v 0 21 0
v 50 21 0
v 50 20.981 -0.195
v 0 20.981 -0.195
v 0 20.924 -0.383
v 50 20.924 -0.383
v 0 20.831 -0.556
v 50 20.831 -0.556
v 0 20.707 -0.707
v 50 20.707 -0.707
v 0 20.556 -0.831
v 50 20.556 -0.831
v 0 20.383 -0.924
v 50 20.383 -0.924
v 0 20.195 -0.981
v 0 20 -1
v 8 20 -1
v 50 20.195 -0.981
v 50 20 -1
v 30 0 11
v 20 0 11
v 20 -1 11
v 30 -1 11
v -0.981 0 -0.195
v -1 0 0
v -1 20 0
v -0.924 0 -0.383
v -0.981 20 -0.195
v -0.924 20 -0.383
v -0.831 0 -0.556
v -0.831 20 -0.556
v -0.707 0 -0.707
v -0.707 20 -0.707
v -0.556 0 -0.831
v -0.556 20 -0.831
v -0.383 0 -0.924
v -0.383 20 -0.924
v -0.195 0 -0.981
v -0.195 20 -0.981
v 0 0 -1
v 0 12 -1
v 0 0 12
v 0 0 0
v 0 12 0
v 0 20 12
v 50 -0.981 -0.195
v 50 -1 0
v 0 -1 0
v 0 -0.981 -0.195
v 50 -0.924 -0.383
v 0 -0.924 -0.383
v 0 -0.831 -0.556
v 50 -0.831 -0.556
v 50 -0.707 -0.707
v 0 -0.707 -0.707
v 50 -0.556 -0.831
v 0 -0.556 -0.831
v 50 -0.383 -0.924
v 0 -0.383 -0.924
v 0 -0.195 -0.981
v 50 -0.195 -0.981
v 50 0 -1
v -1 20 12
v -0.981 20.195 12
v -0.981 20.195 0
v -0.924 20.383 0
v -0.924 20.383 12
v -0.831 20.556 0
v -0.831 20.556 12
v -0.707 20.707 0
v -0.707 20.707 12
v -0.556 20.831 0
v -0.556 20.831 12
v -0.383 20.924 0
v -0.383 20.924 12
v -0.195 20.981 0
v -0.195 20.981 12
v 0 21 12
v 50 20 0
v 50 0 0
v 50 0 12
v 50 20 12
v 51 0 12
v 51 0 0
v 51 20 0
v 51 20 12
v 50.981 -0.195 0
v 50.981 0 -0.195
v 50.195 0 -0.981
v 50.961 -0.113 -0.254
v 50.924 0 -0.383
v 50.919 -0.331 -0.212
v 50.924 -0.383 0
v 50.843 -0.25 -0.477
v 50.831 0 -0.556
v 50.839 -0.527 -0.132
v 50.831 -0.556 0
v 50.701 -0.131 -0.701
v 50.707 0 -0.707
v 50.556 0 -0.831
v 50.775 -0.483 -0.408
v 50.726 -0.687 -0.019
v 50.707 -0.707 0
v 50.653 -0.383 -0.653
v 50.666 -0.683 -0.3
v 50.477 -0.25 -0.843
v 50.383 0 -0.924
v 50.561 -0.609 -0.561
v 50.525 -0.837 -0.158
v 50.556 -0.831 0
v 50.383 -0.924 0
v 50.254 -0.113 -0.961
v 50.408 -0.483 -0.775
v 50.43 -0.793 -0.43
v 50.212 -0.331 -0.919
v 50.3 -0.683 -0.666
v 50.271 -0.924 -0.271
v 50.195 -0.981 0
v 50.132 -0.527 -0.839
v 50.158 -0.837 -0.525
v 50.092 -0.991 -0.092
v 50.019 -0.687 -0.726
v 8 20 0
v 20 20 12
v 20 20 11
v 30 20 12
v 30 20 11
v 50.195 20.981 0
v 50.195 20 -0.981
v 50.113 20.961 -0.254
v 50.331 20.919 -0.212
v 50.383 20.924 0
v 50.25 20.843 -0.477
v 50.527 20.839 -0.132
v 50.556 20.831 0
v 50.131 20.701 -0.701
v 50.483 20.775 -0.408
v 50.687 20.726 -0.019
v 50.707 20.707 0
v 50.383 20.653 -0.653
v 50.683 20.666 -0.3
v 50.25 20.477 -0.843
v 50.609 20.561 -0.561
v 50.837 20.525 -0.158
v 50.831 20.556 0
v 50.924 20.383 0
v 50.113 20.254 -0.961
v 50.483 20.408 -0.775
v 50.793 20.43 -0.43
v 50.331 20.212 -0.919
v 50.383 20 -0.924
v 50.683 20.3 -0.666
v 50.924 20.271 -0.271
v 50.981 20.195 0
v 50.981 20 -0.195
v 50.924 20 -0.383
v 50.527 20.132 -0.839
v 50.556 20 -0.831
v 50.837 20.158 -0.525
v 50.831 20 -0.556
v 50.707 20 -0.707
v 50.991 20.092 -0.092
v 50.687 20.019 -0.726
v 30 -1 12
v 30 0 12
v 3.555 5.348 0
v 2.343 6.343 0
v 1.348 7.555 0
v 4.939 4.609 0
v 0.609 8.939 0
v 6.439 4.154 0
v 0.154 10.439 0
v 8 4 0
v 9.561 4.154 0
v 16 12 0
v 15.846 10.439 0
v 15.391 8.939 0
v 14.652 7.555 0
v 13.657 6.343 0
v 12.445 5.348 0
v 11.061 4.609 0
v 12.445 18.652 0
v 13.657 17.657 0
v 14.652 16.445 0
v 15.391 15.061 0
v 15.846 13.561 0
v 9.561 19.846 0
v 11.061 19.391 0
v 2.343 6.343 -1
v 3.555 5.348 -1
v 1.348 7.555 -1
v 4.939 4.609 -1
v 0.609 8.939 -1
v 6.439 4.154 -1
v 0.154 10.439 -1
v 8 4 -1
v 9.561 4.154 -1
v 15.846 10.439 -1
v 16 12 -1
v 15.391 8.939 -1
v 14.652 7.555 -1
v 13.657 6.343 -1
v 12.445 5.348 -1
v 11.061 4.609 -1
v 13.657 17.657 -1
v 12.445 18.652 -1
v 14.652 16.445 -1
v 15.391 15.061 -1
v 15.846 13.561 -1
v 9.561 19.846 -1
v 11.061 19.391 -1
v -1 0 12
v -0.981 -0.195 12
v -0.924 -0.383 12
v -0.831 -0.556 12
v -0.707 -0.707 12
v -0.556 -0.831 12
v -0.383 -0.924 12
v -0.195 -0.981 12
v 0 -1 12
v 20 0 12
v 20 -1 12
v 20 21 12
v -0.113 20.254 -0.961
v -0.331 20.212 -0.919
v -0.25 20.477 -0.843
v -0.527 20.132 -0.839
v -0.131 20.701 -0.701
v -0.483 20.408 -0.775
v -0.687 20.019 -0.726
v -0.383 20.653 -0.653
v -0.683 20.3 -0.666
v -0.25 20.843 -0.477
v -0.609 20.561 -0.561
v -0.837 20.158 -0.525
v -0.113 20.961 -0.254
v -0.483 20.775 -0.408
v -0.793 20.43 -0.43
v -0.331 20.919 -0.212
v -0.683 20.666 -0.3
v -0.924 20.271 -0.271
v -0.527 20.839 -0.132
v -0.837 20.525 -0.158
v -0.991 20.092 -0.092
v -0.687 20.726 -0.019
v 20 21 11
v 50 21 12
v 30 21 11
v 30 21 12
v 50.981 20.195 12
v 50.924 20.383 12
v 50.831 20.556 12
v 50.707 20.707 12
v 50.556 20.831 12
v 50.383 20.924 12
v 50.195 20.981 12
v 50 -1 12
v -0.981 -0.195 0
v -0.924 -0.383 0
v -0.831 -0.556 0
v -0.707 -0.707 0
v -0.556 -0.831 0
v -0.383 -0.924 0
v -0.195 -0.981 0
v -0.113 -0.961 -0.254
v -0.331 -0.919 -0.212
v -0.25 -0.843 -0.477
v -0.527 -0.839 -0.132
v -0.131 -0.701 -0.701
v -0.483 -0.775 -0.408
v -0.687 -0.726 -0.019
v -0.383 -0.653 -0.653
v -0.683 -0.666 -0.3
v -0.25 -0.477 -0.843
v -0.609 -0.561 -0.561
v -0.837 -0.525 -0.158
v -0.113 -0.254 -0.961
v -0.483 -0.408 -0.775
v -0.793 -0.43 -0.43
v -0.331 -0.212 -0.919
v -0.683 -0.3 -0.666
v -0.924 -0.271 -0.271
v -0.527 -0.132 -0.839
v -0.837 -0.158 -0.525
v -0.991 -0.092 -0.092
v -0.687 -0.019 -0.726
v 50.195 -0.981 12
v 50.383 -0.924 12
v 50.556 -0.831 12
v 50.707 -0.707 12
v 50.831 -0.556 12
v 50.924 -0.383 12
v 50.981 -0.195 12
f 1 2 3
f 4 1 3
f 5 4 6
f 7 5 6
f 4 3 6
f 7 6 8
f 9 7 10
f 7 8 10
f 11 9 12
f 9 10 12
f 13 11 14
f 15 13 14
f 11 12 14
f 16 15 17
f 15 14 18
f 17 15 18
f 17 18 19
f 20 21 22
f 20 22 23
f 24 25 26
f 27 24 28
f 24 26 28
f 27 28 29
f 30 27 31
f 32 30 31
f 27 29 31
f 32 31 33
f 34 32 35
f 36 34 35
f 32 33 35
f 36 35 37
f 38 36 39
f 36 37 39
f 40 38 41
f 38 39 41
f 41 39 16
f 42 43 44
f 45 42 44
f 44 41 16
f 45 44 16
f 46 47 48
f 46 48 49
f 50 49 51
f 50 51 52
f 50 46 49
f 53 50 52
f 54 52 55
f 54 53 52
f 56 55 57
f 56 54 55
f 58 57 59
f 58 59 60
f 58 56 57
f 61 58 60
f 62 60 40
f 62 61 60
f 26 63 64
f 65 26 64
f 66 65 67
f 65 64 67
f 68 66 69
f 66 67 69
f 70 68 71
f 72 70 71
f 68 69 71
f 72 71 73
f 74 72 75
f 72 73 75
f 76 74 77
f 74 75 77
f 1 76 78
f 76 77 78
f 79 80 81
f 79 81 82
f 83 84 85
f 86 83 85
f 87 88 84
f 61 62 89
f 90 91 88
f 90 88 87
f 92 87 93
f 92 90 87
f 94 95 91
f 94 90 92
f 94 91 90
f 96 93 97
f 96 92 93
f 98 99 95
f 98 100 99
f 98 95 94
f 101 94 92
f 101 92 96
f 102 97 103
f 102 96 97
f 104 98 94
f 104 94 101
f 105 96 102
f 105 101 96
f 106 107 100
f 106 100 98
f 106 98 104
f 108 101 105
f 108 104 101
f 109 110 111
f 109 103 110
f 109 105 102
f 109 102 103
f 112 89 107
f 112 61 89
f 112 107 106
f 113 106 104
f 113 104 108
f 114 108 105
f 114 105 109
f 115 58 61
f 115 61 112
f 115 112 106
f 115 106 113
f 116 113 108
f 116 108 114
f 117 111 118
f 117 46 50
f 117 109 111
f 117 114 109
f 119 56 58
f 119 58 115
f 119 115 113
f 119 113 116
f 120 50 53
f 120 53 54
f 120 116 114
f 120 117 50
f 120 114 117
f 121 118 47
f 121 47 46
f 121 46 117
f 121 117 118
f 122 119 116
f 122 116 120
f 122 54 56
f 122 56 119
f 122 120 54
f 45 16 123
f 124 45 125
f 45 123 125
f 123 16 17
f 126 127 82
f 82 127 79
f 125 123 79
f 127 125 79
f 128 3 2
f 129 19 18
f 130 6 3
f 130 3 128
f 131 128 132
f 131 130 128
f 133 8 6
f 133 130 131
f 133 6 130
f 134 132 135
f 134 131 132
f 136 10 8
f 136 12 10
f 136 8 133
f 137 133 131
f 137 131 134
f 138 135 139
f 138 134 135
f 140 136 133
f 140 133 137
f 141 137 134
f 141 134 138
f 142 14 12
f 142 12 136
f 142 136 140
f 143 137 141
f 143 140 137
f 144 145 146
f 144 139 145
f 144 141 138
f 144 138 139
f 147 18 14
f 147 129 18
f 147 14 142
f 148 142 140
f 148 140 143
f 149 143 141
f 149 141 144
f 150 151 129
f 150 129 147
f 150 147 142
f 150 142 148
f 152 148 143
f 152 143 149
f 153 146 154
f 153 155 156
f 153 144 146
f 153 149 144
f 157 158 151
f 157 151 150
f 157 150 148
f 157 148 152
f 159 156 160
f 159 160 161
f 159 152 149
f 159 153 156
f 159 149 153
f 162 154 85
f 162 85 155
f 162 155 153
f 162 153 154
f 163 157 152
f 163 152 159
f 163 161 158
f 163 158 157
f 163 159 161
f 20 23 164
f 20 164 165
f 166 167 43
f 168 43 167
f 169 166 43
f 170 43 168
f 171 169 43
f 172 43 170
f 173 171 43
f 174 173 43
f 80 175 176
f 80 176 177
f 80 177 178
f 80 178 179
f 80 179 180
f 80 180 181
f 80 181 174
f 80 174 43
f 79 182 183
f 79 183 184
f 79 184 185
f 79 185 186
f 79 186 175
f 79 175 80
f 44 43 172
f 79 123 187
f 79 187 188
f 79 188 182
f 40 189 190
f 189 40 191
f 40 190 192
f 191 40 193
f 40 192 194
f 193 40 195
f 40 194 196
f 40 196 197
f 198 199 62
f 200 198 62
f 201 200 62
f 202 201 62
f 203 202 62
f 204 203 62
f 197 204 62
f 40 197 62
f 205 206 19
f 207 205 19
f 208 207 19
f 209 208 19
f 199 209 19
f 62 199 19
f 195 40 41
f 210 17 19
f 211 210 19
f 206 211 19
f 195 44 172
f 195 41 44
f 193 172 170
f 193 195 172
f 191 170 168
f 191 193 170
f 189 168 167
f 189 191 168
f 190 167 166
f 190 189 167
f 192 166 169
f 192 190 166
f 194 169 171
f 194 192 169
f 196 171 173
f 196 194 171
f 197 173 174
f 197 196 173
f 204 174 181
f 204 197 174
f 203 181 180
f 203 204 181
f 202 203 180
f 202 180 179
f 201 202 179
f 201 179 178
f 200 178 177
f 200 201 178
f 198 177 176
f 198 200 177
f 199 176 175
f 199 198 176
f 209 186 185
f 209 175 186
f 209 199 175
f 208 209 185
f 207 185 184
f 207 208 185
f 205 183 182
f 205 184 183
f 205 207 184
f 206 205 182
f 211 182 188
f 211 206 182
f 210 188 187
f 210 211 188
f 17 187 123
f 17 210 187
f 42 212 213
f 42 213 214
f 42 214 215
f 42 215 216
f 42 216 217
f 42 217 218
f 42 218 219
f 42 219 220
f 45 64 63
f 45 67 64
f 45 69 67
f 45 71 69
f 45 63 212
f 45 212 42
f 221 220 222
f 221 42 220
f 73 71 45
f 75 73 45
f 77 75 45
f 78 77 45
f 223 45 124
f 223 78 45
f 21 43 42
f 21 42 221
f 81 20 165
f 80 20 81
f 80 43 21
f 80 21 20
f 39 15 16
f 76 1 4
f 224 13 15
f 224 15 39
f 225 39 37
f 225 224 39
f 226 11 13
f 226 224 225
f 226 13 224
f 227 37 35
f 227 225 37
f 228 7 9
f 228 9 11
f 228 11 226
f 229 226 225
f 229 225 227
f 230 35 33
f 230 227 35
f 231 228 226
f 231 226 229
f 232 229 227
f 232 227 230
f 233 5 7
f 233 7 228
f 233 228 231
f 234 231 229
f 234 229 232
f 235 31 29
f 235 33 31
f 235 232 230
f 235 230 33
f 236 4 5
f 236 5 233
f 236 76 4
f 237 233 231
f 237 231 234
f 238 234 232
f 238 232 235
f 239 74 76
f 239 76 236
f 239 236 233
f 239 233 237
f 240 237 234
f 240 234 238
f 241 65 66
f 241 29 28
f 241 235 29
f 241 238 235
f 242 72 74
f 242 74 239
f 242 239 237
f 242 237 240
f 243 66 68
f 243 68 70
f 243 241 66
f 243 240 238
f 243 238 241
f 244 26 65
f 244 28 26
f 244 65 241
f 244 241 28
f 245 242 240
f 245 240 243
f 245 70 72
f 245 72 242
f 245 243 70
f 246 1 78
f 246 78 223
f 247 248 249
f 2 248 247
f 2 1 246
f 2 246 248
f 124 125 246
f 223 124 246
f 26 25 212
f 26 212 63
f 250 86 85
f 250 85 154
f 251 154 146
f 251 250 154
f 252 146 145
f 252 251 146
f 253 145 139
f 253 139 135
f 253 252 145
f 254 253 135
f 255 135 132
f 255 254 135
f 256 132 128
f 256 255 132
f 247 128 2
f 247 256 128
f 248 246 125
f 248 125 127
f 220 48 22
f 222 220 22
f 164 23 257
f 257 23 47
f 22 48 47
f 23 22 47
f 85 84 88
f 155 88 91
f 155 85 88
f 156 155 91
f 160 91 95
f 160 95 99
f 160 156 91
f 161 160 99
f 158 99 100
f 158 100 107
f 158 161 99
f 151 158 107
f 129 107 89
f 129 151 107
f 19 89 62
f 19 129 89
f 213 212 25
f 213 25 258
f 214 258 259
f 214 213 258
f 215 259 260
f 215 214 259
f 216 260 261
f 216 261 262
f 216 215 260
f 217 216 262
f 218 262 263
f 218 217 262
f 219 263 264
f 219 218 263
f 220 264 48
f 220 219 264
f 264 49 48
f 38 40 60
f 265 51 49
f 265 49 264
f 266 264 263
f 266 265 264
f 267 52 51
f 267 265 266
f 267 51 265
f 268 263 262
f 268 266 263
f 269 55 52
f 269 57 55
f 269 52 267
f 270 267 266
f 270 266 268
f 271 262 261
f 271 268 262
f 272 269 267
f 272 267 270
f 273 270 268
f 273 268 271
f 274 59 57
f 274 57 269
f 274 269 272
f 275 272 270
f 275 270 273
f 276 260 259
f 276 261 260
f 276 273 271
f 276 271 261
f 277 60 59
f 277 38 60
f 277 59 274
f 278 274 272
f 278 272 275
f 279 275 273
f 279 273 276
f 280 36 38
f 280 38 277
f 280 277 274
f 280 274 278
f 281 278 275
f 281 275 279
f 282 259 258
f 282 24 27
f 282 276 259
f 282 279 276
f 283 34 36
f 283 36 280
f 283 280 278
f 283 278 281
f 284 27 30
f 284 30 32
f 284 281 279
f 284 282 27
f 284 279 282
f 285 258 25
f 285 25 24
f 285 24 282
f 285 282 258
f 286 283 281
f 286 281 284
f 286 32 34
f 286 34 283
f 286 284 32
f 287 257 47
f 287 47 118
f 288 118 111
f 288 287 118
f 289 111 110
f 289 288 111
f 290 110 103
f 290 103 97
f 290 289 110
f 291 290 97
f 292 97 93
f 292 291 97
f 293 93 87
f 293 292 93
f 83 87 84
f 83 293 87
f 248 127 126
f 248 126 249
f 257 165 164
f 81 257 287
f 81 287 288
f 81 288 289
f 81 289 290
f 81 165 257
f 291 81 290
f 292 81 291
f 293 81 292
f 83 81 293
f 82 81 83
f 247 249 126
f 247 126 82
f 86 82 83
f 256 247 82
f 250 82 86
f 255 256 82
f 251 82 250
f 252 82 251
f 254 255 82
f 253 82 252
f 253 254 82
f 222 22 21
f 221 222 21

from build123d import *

# Parameters (mm, degrees)
BOX_W          = 50
BOX_H          = 20
BOX_DEPTH      = 12
THICKNESS_T    = 1
CYLINDER_R     = 8
CYLINDER_DEPTH = 1
BOX001_W       = 10
BOX001_H       = 22
BOX001_DEPTH   = 1
BOX002_W       = 8
BOX002_H       = 8
BOX002_DEPTH   = 1


with BuildPart() as part:
    # Box → Box (join)
    with BuildSketch(Plane.XY):
        with Locations((25, 10)):
            Rectangle(BOX_W, BOX_H)
    extrude(amount=BOX_DEPTH)

    # Thickness
    thickness_openings = [part.faces().sort_by_distance(p)[0] for p in [
        (25, 10, 12),
    ]]
    offset(amount=THICKNESS_T, openings=thickness_openings)

    # Cylinder → Cylinder (cut)
    with BuildSketch(Plane(origin=(8, 12, -1), x_dir=(1, 0, 0), z_dir=(0, 0, 1))):
        Circle(CYLINDER_R)
    extrude(amount=CYLINDER_DEPTH, mode=Mode.SUBTRACT)

    # Box001 → Box001 (cut)
    with BuildSketch(Plane(origin=(20, -1, 11), x_dir=(1, 0, 0), z_dir=(0, 0, 1))):
        with Locations((5, 11)):
            Rectangle(BOX001_W, BOX001_H)
    extrude(amount=BOX001_DEPTH, mode=Mode.SUBTRACT)

    # Box002 → Box002 (cut)
    with BuildSketch(Plane(origin=(0, 12, -1), x_dir=(1, 0, 0), z_dir=(0, 0, 1))):
        with Locations((4, 4)):
            Rectangle(BOX002_W, BOX002_H)
    extrude(amount=BOX002_DEPTH, mode=Mode.SUBTRACT)


solid = part.part
